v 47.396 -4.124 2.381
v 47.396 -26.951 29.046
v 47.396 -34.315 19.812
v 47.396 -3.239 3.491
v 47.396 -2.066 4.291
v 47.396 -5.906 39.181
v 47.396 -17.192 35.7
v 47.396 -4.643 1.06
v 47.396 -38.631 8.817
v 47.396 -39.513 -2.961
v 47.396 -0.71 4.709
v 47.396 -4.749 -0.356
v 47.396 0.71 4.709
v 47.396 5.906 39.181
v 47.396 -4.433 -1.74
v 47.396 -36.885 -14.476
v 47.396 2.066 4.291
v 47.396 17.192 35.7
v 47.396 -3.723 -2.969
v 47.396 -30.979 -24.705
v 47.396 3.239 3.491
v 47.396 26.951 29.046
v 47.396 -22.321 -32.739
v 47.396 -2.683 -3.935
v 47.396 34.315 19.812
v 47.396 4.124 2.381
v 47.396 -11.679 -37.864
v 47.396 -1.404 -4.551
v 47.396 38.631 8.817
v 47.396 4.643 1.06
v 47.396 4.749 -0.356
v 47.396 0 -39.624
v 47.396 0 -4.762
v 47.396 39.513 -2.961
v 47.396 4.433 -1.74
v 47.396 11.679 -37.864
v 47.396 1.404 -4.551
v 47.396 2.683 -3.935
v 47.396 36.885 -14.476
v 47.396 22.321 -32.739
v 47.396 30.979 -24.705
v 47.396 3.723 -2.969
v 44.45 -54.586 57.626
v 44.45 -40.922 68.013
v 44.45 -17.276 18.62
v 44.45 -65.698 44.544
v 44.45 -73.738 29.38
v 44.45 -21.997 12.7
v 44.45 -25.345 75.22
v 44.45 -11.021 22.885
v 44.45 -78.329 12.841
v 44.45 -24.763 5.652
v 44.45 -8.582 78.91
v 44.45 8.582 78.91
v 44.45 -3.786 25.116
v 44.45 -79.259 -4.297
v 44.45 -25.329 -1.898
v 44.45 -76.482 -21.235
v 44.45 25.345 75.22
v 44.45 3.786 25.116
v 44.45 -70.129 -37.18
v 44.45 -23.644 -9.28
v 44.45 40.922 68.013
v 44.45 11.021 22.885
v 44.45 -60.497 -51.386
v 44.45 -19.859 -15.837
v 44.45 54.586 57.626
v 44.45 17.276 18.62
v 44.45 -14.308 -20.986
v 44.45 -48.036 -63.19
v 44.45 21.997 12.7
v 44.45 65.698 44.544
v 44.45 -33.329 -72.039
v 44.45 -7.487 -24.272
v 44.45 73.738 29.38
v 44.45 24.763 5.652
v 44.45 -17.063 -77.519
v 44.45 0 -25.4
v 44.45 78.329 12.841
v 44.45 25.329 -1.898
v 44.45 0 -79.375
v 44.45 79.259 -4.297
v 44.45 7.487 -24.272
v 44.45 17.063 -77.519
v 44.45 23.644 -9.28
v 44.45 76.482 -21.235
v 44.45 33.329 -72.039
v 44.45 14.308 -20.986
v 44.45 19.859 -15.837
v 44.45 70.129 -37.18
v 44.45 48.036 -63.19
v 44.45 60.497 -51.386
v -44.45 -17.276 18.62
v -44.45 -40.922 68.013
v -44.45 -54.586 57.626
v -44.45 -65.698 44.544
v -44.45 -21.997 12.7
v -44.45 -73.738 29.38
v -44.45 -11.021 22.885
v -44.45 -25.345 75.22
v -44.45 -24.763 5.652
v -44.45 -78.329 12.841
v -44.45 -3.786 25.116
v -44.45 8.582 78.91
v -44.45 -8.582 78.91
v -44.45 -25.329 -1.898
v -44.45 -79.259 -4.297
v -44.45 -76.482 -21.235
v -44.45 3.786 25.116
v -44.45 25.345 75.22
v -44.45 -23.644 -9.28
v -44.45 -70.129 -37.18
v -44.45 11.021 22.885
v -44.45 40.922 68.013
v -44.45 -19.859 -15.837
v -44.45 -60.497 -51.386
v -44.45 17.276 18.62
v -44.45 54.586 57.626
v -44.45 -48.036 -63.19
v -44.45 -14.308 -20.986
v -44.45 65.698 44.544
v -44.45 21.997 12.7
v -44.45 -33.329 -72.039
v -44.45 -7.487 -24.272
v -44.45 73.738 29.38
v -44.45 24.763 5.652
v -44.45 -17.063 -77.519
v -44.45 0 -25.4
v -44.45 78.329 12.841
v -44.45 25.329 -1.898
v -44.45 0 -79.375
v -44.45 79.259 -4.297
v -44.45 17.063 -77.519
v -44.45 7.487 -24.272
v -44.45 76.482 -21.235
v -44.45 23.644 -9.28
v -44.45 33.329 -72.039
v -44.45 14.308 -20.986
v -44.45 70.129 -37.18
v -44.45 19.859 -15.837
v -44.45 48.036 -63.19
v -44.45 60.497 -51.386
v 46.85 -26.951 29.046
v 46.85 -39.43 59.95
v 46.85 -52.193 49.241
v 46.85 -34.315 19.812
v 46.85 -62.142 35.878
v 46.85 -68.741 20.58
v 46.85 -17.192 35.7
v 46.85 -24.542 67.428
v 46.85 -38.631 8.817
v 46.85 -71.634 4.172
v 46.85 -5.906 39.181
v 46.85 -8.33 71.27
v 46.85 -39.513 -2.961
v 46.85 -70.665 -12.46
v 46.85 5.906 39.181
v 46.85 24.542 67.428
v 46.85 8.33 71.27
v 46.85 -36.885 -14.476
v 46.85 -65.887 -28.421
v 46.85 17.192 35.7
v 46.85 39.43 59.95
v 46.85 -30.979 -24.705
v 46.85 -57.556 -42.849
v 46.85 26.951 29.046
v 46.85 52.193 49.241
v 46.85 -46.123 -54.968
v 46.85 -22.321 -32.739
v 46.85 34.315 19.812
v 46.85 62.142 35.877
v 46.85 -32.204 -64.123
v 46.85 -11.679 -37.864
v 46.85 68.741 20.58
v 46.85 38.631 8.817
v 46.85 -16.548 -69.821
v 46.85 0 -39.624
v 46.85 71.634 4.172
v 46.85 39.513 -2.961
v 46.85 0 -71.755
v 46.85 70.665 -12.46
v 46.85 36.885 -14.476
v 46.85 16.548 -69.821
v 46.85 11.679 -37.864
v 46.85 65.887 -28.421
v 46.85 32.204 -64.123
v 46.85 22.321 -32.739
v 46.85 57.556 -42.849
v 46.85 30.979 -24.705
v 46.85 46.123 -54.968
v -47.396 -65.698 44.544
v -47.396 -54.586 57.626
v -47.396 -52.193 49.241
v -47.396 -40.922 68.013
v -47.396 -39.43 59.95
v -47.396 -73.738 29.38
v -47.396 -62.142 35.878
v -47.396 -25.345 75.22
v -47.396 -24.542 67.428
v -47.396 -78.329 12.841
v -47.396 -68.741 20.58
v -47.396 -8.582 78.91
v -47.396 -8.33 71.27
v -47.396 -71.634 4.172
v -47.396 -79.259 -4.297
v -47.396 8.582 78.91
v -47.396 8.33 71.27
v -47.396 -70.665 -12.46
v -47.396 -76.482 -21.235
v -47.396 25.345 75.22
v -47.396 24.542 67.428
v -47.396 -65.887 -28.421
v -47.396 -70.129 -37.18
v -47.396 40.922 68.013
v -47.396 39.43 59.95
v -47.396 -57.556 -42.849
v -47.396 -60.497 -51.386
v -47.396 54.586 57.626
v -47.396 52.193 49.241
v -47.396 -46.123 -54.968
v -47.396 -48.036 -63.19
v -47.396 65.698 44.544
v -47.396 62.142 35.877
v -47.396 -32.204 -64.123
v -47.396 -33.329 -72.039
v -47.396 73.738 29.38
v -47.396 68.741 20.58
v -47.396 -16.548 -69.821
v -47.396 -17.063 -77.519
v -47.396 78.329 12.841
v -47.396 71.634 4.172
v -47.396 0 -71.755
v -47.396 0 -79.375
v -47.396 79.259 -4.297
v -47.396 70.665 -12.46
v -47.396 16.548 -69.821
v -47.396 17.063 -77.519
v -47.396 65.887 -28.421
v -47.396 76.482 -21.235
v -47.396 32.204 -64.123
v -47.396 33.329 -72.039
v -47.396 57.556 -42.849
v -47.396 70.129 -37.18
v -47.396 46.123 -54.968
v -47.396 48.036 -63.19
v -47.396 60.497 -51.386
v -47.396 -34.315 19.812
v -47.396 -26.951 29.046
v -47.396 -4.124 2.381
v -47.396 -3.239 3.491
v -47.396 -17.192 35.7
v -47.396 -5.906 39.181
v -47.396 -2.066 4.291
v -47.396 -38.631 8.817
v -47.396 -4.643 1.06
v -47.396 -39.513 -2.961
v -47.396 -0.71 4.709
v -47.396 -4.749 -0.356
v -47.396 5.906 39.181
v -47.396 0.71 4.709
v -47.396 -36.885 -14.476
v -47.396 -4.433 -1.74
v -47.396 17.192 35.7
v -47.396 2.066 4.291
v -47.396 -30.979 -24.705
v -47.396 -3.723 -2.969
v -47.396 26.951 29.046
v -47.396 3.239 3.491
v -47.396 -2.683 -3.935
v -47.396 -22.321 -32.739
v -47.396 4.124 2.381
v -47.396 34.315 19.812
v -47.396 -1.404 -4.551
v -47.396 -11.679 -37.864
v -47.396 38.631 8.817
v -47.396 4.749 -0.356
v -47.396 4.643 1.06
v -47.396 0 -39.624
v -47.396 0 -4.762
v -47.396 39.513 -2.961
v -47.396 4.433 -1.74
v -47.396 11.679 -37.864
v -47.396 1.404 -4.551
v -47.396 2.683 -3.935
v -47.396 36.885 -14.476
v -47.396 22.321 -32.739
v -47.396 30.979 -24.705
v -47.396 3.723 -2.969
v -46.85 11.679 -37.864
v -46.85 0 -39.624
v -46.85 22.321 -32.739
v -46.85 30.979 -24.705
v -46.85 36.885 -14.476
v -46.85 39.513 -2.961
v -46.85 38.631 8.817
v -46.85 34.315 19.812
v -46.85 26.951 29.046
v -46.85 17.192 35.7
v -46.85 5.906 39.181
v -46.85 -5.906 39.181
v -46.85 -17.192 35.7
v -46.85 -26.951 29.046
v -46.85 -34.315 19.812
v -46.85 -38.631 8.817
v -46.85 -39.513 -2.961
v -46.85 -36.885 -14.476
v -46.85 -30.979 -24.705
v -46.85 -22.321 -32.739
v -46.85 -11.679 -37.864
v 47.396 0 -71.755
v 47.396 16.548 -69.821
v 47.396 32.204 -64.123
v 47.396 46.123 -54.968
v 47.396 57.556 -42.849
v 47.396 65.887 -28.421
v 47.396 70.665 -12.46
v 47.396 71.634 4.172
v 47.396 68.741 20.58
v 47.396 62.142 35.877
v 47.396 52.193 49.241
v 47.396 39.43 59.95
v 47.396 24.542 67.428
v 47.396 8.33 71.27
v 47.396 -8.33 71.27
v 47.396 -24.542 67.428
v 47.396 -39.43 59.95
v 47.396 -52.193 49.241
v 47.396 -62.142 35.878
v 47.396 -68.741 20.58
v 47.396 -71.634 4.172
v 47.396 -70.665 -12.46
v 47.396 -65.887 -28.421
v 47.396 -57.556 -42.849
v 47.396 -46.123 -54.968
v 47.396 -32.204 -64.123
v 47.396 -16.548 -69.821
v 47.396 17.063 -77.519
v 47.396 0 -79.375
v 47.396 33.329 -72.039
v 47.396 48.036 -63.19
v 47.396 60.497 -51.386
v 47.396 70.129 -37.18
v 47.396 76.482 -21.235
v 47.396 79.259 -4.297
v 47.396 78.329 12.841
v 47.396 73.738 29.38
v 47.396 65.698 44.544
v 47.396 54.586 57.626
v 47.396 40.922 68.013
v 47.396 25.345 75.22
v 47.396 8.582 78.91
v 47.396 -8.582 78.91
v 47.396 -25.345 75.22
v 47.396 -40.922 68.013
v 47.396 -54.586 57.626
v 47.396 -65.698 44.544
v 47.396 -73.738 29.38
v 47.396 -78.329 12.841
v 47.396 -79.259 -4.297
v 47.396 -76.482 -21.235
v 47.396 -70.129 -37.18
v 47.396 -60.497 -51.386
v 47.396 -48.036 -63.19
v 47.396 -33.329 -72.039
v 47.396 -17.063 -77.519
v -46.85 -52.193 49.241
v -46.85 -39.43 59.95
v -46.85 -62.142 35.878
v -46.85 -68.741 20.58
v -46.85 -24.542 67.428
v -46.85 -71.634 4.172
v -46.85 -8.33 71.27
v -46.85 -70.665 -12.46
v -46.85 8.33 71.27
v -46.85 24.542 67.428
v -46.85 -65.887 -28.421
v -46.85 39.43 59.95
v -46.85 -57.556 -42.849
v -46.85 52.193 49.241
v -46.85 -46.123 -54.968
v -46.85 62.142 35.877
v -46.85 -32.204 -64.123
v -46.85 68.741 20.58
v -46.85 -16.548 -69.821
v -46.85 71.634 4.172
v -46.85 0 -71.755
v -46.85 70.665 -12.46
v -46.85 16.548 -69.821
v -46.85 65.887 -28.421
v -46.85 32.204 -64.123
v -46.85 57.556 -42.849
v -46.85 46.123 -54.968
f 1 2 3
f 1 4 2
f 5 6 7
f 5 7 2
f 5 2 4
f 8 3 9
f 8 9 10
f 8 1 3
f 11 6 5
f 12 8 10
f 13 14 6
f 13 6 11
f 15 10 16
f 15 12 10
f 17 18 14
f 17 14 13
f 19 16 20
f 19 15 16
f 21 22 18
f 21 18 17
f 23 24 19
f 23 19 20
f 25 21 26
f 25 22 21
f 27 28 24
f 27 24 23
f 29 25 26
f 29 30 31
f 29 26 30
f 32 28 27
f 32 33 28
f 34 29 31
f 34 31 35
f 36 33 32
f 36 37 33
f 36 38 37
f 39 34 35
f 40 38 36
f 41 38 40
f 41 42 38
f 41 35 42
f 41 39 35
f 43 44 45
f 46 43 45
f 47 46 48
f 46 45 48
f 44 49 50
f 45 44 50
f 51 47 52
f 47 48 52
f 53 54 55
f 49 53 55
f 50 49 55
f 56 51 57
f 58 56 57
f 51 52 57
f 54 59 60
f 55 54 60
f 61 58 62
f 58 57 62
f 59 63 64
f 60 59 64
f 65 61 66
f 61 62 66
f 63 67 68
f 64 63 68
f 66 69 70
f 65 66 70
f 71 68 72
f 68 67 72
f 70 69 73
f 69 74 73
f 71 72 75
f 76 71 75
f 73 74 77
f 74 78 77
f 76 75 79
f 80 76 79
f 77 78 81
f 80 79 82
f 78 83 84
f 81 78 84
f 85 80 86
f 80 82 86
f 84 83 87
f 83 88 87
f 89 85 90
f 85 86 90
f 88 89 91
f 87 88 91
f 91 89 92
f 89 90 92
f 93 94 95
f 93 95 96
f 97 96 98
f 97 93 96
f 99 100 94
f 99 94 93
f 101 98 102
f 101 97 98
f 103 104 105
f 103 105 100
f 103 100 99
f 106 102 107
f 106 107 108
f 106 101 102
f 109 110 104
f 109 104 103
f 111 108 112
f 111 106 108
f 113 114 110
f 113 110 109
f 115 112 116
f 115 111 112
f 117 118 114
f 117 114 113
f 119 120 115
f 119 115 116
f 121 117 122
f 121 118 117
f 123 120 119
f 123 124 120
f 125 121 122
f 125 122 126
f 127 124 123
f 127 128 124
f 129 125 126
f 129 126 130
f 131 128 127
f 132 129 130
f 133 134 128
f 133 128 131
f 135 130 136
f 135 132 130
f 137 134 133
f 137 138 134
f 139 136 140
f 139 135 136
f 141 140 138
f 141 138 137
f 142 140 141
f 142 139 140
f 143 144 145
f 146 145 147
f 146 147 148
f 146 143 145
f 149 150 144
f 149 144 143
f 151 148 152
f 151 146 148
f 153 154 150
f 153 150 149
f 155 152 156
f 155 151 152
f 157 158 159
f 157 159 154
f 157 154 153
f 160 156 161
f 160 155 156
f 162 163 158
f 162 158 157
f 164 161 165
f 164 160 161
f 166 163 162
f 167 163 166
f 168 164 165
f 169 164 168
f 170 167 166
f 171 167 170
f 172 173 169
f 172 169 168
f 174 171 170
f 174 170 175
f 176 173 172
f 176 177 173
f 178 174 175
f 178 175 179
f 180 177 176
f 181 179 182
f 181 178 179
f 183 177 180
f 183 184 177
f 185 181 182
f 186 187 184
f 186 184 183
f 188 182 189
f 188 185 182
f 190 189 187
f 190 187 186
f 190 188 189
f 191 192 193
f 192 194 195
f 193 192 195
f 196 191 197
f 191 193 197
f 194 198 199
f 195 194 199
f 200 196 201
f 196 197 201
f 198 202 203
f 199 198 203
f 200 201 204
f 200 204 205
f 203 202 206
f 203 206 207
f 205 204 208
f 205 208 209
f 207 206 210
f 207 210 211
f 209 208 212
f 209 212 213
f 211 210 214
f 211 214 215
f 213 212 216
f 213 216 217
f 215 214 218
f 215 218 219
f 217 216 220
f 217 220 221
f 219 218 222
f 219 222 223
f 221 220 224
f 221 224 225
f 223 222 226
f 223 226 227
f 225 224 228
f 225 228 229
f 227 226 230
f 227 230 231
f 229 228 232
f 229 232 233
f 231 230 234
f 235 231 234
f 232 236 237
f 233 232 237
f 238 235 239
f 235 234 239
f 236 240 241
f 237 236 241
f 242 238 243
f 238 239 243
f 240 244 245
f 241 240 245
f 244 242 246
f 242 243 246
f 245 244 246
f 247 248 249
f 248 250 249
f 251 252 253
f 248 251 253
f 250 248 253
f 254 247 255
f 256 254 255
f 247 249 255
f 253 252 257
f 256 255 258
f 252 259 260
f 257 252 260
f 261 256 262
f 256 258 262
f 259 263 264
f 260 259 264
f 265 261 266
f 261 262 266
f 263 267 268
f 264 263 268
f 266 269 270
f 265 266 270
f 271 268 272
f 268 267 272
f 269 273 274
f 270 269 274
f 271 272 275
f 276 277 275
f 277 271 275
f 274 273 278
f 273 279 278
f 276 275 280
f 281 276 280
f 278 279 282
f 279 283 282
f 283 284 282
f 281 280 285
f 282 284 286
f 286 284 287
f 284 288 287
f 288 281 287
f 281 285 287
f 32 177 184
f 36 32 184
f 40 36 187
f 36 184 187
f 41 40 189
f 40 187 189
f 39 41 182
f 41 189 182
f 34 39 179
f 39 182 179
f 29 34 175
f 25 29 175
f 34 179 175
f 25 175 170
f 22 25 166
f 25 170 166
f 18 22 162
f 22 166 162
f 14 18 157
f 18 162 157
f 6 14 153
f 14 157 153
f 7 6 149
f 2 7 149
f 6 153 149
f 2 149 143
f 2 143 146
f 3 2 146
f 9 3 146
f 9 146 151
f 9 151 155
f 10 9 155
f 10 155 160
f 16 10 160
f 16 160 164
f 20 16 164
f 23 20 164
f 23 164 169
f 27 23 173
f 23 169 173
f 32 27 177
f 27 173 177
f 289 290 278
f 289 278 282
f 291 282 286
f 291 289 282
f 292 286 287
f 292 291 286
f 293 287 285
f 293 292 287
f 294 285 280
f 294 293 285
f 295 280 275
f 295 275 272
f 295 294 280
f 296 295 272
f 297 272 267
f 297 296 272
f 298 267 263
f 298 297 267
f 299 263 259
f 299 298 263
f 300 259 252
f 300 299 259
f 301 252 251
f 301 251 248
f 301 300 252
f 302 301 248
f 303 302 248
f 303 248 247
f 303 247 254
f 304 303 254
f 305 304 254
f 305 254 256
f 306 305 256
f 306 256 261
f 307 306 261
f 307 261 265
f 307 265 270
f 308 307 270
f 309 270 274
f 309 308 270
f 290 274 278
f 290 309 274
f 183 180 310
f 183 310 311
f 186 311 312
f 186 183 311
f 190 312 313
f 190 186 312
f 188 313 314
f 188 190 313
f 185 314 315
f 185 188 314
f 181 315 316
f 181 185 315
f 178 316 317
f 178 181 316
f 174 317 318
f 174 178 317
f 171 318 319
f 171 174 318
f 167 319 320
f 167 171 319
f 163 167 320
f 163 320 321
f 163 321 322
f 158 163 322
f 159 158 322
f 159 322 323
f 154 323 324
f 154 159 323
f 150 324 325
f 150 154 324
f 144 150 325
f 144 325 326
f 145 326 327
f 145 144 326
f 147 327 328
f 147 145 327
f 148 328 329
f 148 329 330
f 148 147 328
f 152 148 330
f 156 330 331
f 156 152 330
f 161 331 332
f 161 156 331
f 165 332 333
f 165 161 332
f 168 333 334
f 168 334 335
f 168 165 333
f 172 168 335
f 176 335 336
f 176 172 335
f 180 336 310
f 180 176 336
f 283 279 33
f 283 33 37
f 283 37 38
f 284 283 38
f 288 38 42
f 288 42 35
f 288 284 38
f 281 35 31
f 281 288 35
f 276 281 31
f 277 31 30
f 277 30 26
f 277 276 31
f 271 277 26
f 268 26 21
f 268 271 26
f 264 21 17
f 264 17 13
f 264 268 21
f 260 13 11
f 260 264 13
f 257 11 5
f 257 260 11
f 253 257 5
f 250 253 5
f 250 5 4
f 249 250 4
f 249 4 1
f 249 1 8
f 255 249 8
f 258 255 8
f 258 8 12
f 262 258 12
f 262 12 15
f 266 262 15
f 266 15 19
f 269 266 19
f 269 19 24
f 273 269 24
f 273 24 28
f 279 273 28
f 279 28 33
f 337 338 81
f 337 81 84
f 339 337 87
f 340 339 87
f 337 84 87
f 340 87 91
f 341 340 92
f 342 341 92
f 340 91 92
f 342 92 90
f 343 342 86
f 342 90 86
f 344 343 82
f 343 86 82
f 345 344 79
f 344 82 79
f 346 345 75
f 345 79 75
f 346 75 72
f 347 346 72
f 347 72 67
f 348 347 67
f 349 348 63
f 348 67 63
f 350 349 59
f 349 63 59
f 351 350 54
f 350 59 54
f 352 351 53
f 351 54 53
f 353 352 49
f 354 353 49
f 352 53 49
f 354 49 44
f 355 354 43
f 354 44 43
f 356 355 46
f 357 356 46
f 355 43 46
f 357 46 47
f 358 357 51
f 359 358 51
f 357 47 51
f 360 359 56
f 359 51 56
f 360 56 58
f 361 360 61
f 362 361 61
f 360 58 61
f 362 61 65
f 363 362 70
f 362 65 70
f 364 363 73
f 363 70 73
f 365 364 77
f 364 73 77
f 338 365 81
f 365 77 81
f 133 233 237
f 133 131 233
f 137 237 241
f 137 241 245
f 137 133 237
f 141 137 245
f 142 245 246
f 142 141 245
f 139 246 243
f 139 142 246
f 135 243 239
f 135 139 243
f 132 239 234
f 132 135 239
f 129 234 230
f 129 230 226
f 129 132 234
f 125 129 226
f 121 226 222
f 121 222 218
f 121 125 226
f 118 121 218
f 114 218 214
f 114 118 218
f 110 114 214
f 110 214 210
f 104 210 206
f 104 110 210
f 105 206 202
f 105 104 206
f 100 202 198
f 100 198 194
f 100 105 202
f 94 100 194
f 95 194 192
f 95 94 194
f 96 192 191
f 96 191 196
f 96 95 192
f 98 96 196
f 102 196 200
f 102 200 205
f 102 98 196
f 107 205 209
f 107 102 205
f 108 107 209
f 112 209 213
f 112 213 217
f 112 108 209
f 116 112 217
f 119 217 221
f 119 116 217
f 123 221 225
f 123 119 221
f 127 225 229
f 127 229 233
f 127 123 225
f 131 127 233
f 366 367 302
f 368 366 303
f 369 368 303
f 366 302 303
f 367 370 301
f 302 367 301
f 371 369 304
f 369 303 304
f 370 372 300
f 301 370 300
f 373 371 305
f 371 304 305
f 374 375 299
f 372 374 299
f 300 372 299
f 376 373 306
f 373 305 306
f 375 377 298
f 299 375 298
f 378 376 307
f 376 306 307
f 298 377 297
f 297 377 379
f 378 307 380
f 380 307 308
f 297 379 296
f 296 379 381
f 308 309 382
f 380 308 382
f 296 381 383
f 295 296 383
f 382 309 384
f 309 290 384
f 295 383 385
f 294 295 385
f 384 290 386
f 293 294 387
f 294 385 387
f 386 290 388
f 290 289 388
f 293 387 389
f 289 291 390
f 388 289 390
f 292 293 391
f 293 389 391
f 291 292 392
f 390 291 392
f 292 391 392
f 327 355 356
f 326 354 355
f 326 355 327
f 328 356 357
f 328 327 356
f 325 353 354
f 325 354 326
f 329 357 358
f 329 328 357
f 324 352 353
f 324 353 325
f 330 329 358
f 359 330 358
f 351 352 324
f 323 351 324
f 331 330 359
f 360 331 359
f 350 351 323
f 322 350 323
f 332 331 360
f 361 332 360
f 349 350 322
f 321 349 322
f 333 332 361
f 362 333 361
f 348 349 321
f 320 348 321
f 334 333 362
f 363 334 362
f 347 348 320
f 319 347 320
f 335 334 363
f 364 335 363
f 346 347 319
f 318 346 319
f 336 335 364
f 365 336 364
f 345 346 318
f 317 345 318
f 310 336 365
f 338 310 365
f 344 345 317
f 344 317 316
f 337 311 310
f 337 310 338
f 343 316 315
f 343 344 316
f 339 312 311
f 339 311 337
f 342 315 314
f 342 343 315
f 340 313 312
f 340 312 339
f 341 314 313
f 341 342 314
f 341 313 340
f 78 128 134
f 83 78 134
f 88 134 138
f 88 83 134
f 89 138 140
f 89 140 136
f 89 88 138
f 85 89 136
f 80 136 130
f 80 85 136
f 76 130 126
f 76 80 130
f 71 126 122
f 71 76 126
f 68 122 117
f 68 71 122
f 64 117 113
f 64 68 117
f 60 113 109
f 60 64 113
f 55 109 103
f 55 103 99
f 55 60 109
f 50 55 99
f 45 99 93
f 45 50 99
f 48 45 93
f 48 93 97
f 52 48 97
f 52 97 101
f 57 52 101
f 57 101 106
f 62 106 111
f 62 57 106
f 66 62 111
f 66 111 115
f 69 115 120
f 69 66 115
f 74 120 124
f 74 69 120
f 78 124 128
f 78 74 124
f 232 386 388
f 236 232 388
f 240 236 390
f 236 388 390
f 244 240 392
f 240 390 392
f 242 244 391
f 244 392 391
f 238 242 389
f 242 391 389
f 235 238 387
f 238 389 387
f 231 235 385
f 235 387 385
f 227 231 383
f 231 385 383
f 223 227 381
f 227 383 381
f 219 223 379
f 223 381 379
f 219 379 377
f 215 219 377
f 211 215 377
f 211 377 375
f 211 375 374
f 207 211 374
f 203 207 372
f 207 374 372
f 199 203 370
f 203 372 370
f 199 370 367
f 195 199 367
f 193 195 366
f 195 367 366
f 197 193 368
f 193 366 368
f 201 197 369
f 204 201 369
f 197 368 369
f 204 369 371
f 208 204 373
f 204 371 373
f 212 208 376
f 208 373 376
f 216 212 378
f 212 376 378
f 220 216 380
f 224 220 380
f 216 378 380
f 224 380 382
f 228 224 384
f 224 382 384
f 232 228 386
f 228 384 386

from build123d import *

# Parameters (mm, degrees)
SKETCH1_R           = 25.4
BOSS_EXTRUDE1_DEPTH = 44.45
SKETCH2_R           = 79.375
BOSS_EXTRUDE2_DEPTH = 2.4003
SKETCH3_R           = 79.375
SKETCH3_R_2         = 71.755
BOSS_EXTRUDE3_DEPTH = 0.5461
SKETCH4_R           = 39.624
BOSS_EXTRUDE4_DEPTH = 0.5461
SKETCH5_R           = 4.7625
CUT_EXTRUDE1_DEPTH  = 122.849086919


with BuildPart() as part:
    # Sketch1 → Boss-Extrude1 (new body)
    with BuildSketch(Plane(origin=(0, 0, 0), x_dir=(0, 0, -1), z_dir=(1, 0, 0))):
        Circle(SKETCH1_R)
    boss_extrude1 = extrude(amount=BOSS_EXTRUDE1_DEPTH)

    # Sketch2 → Boss-Extrude2 (add)
    with BuildSketch(Plane(origin=(44.45, 0, 0), x_dir=(0, 0, -1), z_dir=(1, 0, 0))):
        Circle(SKETCH2_R)
    boss_extrude2 = extrude(amount=BOSS_EXTRUDE2_DEPTH)

    # Sketch3 → Boss-Extrude3 (add)
    with BuildSketch(Plane(origin=(46.8503, 0, 0), x_dir=(0, 0, -1), z_dir=(1, 0, 0))):
        Circle(SKETCH3_R)
        Circle(SKETCH3_R_2, mode=Mode.SUBTRACT)
    boss_extrude3 = extrude(amount=BOSS_EXTRUDE3_DEPTH)

    # Sketch4 → Boss-Extrude4 (add)
    with BuildSketch(Plane(origin=(46.8503, 0, 0), x_dir=(0, 0, -1), z_dir=(1, 0, 0))):
        Circle(SKETCH4_R)
    boss_extrude4 = extrude(amount=BOSS_EXTRUDE4_DEPTH)

    # Sketch5 → Cut-Extrude1 (cut, through all)
    with BuildSketch(Plane(origin=(47.3964, 0, 0), x_dir=(0, 0, -1), z_dir=(1, 0, 0))):
        Circle(SKETCH5_R)
    cut_extrude1 = extrude(amount=-CUT_EXTRUDE1_DEPTH, mode=Mode.SUBTRACT)

    # Mirror1: Boss-Extrude1, Boss-Extrude2, Boss-Extrude3, Boss-Extrude4, Cut-Extrude1 across plane
    add(boss_extrude1.mirror(Plane(origin=(0, 0, 0), x_dir=(0, 0, 1), z_dir=(1, 0, 0))))
    add(boss_extrude2.mirror(Plane(origin=(0, 0, 0), x_dir=(0, 0, 1), z_dir=(1, 0, 0))))
    add(boss_extrude3.mirror(Plane(origin=(0, 0, 0), x_dir=(0, 0, 1), z_dir=(1, 0, 0))))
    add(boss_extrude4.mirror(Plane(origin=(0, 0, 0), x_dir=(0, 0, 1), z_dir=(1, 0, 0))))
    add(cut_extrude1.mirror(Plane(origin=(0, 0, 0), x_dir=(0, 0, 1), z_dir=(1, 0, 0))), mode=Mode.SUBTRACT)


solid = part.part
